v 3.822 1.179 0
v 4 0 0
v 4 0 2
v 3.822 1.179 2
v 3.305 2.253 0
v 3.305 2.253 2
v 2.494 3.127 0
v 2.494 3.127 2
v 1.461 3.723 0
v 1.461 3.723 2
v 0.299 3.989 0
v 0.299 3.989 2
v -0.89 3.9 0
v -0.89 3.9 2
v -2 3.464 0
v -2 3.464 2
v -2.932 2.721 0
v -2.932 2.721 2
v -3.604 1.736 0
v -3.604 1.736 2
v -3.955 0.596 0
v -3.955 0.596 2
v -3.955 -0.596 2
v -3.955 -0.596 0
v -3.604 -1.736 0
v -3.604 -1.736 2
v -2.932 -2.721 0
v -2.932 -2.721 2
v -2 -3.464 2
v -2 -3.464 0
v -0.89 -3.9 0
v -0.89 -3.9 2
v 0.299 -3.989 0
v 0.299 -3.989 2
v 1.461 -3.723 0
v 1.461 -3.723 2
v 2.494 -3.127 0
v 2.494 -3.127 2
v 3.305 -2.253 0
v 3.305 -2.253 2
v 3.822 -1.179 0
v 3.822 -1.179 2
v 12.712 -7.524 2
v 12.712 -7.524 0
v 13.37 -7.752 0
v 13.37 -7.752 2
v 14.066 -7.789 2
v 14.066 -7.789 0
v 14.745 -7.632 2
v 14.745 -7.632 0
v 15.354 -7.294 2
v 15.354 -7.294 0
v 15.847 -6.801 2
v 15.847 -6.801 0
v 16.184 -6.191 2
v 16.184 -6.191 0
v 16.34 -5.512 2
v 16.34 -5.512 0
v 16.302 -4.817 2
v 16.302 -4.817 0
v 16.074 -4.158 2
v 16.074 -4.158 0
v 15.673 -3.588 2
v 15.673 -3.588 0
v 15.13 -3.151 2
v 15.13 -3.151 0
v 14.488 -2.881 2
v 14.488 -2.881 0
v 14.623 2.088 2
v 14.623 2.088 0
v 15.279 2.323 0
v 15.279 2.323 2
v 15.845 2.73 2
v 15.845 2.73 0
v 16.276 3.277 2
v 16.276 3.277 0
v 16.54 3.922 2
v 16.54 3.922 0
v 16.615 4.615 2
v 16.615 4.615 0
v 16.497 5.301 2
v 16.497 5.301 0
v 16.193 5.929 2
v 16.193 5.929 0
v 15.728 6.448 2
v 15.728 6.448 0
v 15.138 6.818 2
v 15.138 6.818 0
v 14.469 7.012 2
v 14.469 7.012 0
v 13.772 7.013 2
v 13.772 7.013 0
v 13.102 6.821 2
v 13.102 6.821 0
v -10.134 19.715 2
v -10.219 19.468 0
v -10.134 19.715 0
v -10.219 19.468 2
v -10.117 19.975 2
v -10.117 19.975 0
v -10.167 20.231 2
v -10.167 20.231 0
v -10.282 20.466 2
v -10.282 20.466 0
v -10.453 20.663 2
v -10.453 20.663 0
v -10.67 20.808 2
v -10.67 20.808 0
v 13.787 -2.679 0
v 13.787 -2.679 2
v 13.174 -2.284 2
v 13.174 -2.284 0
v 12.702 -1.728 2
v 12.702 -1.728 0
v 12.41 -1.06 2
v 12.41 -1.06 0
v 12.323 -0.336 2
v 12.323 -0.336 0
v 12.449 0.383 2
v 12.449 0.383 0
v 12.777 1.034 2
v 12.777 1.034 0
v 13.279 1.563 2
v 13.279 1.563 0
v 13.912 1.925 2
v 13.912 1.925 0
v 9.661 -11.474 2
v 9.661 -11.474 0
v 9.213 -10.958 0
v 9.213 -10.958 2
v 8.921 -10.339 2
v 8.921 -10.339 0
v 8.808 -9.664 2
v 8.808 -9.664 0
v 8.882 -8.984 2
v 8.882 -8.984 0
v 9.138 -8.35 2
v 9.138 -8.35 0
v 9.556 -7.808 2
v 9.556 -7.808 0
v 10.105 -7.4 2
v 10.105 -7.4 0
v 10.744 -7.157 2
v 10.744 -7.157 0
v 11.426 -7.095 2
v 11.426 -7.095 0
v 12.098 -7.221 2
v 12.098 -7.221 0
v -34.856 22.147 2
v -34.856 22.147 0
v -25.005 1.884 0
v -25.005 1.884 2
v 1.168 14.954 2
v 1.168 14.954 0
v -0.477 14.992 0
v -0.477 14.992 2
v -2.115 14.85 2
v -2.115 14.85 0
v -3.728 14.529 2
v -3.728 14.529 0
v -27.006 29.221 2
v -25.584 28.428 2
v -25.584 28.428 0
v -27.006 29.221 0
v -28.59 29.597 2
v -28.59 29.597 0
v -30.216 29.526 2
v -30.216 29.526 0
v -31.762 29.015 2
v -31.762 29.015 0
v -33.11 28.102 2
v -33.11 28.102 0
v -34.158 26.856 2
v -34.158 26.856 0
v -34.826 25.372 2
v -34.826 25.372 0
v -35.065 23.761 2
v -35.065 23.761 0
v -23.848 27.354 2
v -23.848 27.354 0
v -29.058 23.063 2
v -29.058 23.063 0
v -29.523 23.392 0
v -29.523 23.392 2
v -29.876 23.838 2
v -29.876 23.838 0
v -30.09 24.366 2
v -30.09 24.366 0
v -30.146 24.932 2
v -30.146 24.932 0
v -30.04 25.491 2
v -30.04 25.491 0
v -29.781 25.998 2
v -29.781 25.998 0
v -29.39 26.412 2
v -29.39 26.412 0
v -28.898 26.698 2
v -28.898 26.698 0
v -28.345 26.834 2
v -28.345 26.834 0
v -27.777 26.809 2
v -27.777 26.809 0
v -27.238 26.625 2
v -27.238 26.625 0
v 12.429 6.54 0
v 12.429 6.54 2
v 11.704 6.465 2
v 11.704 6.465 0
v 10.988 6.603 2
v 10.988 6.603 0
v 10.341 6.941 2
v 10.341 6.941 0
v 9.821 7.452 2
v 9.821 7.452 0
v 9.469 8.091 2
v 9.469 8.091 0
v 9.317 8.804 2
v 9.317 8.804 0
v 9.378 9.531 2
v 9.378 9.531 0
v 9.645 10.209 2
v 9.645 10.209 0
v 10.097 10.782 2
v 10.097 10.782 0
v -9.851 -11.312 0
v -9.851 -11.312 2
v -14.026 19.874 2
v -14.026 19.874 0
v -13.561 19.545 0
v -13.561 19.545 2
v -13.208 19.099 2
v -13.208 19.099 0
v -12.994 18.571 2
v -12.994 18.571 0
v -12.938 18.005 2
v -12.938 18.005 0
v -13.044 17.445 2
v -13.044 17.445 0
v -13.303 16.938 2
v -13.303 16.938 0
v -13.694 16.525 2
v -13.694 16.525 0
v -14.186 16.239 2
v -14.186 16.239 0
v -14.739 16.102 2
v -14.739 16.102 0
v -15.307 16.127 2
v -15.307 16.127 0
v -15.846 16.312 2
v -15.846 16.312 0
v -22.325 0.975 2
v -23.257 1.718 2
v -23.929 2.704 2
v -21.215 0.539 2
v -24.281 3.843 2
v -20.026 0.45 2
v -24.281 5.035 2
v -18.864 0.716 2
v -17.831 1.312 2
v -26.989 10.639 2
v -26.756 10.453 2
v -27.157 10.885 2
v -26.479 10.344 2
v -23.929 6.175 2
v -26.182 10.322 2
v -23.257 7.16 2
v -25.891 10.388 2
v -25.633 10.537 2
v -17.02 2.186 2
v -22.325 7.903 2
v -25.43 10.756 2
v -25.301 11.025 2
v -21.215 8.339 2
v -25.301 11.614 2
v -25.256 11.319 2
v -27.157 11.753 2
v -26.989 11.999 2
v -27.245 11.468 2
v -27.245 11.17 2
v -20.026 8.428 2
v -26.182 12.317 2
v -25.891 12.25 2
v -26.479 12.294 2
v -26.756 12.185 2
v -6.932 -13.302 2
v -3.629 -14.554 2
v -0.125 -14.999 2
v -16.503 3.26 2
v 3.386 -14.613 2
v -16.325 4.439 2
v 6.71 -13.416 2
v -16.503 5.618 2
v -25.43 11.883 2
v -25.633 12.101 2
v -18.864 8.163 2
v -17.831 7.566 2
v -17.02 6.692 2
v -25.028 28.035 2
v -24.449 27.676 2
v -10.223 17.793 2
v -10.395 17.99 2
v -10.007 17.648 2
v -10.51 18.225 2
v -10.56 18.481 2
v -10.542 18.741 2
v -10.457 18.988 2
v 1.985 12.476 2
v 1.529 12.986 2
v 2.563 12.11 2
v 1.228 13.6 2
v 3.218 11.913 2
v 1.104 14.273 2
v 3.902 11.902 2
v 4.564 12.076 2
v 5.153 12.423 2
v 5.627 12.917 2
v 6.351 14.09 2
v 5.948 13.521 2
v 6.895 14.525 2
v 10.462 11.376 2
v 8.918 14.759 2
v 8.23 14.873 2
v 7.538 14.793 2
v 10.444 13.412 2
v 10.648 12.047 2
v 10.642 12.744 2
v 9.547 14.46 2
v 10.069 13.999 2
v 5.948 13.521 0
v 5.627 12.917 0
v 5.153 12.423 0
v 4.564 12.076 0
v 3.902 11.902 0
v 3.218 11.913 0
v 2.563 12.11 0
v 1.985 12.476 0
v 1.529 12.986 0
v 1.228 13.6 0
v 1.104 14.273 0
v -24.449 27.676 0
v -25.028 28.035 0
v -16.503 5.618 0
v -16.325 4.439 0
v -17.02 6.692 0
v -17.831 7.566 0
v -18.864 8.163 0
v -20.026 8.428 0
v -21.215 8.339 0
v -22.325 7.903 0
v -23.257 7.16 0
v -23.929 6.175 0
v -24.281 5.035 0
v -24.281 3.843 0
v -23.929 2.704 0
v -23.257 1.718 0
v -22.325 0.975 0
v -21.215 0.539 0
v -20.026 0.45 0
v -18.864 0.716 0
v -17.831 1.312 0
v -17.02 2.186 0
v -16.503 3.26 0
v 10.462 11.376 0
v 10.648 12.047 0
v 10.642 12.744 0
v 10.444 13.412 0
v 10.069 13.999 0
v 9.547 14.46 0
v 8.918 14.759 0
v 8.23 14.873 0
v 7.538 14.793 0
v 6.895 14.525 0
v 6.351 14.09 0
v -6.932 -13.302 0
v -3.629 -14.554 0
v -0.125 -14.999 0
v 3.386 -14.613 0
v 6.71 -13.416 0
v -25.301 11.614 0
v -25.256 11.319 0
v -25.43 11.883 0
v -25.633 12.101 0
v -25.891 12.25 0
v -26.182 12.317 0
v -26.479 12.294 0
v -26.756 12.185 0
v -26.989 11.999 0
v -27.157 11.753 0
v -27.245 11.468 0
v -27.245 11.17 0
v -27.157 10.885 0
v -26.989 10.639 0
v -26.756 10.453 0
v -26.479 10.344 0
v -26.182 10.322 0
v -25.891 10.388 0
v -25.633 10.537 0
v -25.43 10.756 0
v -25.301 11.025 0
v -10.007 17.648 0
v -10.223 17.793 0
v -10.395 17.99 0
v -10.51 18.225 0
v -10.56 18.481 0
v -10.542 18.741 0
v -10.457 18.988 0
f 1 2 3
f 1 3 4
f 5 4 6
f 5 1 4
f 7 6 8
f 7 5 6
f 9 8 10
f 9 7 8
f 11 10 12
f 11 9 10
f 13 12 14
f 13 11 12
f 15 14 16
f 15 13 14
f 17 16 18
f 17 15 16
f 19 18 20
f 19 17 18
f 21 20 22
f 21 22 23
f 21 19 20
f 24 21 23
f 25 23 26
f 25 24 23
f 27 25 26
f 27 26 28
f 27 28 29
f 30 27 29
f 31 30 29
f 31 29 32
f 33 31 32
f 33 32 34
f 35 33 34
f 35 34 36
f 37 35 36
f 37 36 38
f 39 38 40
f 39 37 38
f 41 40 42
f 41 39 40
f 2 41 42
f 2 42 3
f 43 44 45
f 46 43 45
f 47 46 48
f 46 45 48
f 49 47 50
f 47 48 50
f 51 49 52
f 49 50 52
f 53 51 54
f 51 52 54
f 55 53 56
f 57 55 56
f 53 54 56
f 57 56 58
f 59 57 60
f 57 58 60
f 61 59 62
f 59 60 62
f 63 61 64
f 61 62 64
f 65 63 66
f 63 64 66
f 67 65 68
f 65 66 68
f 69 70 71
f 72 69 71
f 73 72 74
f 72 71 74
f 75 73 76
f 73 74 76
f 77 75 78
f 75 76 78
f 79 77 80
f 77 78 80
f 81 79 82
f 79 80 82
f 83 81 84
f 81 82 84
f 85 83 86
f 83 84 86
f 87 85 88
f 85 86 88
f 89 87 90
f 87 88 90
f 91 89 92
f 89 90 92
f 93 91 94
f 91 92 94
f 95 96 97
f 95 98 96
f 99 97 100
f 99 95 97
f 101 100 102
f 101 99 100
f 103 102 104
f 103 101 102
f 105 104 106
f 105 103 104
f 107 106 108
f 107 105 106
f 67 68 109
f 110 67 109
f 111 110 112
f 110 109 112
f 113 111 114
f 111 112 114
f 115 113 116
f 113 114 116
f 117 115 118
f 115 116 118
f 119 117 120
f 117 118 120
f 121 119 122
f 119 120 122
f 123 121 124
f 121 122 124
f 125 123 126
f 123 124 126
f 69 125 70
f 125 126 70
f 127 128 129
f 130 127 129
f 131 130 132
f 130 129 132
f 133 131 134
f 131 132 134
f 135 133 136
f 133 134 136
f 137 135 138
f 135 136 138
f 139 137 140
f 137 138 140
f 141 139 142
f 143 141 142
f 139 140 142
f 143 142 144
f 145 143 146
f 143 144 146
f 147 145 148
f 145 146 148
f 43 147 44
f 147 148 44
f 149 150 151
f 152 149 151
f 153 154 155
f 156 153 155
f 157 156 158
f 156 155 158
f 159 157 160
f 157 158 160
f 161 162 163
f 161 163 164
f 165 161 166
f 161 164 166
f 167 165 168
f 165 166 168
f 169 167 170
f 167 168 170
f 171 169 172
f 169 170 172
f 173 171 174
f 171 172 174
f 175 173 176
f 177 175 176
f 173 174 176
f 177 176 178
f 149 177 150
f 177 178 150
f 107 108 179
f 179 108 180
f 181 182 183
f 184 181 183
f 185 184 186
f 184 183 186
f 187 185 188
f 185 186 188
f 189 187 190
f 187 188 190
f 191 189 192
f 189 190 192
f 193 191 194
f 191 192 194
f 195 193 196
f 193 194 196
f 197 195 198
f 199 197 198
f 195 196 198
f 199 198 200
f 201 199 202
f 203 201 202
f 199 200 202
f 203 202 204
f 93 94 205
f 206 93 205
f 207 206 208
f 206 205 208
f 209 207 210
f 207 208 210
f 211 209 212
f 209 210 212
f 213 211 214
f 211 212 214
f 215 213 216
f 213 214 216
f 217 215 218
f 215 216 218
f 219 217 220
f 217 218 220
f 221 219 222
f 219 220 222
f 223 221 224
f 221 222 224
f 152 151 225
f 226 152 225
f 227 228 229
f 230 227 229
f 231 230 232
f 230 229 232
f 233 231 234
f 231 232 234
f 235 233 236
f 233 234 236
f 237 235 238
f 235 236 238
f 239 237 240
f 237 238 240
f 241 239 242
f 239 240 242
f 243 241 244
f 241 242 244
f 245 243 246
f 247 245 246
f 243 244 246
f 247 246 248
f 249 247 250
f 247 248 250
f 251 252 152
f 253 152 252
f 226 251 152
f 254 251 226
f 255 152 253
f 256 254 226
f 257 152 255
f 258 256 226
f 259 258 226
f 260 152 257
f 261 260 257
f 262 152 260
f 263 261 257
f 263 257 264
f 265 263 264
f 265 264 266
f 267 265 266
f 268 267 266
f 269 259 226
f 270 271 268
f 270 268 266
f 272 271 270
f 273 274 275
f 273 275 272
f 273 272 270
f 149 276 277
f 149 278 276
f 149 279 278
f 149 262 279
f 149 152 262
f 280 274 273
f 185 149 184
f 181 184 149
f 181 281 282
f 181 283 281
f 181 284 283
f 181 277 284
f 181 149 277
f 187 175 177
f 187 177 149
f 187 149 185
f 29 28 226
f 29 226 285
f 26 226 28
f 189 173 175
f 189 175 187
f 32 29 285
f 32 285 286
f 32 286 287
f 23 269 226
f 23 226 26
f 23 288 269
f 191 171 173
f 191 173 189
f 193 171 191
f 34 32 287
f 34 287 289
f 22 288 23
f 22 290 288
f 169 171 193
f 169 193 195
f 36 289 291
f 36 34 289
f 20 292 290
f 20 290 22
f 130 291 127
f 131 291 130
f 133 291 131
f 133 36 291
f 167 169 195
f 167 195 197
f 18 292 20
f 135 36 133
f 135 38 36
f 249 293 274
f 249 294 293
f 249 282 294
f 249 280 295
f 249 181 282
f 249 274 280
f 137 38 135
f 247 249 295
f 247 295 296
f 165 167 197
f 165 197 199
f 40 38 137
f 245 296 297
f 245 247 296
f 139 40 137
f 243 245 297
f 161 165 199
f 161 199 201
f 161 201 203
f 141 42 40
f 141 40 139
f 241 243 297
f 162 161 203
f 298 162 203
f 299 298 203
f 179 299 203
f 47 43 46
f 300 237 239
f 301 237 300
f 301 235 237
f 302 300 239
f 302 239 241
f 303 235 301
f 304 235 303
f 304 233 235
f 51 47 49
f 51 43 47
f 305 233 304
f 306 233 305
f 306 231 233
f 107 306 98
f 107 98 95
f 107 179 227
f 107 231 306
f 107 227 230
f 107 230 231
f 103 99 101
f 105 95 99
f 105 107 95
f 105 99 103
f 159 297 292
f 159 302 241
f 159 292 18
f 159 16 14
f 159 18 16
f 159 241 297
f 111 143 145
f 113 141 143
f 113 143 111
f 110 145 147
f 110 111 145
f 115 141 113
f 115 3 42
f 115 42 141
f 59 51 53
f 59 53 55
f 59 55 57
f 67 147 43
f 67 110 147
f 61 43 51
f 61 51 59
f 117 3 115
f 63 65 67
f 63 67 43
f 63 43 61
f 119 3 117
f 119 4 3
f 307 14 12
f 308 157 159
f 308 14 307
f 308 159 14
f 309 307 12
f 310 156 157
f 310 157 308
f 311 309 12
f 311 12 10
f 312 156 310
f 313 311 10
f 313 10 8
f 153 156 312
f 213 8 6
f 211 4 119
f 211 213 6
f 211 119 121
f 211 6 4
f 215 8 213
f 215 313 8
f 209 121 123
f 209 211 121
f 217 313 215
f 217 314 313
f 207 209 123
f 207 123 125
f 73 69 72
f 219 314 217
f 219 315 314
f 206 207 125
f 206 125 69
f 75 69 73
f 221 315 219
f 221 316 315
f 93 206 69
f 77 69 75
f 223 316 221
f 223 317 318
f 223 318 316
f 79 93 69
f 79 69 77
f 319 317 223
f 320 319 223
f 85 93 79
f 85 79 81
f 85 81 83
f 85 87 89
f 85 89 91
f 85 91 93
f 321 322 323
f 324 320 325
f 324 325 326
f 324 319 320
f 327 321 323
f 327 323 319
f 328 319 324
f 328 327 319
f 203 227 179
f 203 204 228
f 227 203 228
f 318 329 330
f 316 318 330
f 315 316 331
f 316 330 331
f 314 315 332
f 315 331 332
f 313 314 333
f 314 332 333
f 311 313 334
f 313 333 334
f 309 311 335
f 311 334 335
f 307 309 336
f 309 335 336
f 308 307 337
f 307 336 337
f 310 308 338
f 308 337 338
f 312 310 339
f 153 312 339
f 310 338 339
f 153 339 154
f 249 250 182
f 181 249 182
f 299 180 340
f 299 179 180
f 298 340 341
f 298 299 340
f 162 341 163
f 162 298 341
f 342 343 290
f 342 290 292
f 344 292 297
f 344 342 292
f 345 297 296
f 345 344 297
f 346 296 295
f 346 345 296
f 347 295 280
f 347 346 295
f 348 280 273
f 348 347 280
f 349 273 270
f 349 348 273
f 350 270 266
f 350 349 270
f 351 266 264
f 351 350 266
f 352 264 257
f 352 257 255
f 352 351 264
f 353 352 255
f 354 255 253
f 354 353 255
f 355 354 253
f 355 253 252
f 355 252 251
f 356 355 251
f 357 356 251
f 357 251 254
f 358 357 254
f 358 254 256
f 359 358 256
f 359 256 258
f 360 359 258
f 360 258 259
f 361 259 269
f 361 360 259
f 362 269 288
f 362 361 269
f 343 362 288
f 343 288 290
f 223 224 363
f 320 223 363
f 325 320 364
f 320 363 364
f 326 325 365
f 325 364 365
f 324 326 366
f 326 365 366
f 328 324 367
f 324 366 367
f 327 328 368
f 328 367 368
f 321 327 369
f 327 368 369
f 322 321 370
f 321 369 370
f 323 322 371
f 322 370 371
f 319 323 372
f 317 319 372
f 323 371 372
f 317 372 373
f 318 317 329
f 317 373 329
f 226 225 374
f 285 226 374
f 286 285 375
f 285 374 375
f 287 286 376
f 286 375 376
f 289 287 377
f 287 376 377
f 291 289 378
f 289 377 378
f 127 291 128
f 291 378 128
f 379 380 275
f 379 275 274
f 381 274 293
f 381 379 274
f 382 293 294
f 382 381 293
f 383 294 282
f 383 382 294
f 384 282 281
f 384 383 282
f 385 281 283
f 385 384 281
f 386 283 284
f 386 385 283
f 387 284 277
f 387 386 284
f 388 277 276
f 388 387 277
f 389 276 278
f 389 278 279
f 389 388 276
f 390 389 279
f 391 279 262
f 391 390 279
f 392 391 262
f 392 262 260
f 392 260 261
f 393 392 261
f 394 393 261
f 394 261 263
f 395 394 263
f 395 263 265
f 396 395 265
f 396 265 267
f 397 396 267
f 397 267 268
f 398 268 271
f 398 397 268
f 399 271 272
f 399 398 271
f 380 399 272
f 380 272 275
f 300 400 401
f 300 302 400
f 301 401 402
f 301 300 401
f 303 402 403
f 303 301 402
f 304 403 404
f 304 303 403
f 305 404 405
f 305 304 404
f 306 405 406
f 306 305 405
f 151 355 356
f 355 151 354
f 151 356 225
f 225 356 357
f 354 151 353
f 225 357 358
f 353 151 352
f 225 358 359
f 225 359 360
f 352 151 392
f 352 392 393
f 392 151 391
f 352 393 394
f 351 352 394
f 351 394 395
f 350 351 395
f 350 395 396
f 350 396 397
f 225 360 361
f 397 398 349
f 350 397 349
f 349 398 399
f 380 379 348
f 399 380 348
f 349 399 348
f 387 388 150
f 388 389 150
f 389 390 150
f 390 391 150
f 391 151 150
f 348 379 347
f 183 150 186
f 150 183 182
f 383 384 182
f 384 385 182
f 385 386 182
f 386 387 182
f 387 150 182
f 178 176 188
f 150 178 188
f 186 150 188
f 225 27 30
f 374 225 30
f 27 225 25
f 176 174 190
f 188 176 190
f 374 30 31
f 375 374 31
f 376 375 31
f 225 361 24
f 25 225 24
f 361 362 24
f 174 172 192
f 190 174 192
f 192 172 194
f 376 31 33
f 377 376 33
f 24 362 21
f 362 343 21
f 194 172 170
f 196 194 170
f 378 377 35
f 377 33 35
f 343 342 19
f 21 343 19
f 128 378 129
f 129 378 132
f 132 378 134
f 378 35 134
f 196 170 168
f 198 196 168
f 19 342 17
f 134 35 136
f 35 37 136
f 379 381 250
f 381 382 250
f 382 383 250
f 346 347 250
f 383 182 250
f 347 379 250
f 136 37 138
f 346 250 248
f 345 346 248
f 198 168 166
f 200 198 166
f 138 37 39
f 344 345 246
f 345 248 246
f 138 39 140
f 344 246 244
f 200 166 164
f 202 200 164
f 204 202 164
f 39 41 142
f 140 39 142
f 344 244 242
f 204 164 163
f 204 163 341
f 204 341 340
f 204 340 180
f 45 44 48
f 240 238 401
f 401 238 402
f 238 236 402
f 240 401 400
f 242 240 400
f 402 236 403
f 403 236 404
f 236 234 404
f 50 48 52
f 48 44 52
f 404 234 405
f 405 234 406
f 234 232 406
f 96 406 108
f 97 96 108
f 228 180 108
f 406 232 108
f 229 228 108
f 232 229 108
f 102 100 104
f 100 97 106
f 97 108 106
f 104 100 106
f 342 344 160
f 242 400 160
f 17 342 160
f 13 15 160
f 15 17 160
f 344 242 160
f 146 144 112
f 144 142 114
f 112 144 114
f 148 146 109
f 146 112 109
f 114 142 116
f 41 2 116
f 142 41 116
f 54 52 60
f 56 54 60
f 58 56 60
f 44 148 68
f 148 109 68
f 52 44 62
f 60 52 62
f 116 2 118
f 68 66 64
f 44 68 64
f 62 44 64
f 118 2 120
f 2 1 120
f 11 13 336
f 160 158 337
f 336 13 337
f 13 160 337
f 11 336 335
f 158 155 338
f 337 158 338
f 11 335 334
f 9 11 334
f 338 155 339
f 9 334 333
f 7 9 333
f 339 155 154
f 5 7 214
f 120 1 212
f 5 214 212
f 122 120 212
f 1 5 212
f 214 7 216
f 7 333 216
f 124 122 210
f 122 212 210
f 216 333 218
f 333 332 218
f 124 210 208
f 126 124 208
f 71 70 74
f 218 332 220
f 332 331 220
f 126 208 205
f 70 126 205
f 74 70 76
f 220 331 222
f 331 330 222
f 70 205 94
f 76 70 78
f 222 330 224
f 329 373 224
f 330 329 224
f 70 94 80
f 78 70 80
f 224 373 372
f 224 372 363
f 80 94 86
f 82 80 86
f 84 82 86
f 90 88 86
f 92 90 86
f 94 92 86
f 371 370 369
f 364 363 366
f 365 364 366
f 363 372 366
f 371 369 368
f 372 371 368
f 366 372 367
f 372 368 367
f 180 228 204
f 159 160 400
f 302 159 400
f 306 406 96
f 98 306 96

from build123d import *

# Parameters (mm, degrees)
ESQUISSE1_R        = 4
ESQUISSE1_R_2      = 1
BOSS_EXTRU_1_DEPTH = 2
CONG_1_R           = 1
CONG_2_R           = 11


with BuildPart() as part:
    # Esquisse1 → Boss.-Extru.1 (new body)
    with BuildSketch(Plane.XY):
        with BuildLine():
            Line((-3.728432128, 14.529239273), (-10.902133324, 18.092613259))
            Line((-10.902133324, 18.092613259), (-9.77414371, 20.363455577))
            Line((-9.77414371, 20.363455577), (-25.005281494, 27.929179137))
            ThreePointArc((-25.005281494, 27.929179137), (-32.144223962, 28.809157948), (-34.856074883, 22.146971607))
            Line((-34.856074883, 22.146971607), (-25.005281494, 1.884444499))
            Line((-25.005281494, 1.884444499), (-9.850606554, -11.31218593))
            ThreePointArc((-9.850606554, -11.31218593), (-0.12474397, -14.999481289), (9.661100255, -11.47445606))
            ThreePointArc((9.661100255, -11.47445606), (9.328139992, -8.064479271), (12.711512496, -7.524484146))
            ThreePointArc((12.711512496, -7.524484146), (16.183775509, -6.191442889), (14.487891216, -2.881218443))
            ThreePointArc((14.487891216, -2.881218443), (12.323112571, -0.335609675), (14.623234656, 2.088401251))
            ThreePointArc((14.623234656, 2.088401251), (16.496773903, 5.301415429), (13.102212542, 6.821468911))
            ThreePointArc((13.102212542, 6.821468911), (9.820570557, 7.451720018), (10.097110191, 10.781872629))
            ThreePointArc((10.097110191, 10.781872629), (9.547104174, 14.460337363), (5.948313856, 13.521019705))
            ThreePointArc((5.948313856, 13.521019705), (2.883768887, 11.988907316), (1.167882396, 14.954465912))
            ThreePointArc((1.167882396, 14.954465912), (-1.297808983, 14.94375093), (-3.728432128, 14.529239273))
        make_face()
        with Locations((-20.325227829, 4.439090716)):
            Circle(ESQUISSE1_R, mode=Mode.SUBTRACT)
        with Locations((-26.256387143, 11.319323515)):
            Circle(ESQUISSE1_R_2, mode=Mode.SUBTRACT)
        with BuildLine():
            ThreePointArc((-29.058075564, 23.063121212), (-29.928943128, 25.754141406), (-27.237922934, 26.625008971))
            Line((-27.237922934, 26.625008971), (-14.025891569, 19.873557138))
            ThreePointArc((-14.025891569, 19.873557138), (-13.155024005, 17.182536944), (-15.846044199, 16.31166938))
            Line((-15.846044199, 16.31166938), (-29.058075564, 23.063121212))
        make_face(mode=Mode.SUBTRACT)
        Circle(ESQUISSE1_R, mode=Mode.SUBTRACT)
    extrude(amount=BOSS_EXTRU_1_DEPTH)

    # Congé1
    cong_1_edges = [part.edges().sort_by_distance(p)[0] for p in [
        (-9.77414371, 20.363455577, 1),
        (-10.902133324, 18.092613259, 1),
    ]]
    fillet(cong_1_edges, radius=CONG_1_R)

    # Congé2
    cong_2_edges = [part.edges().sort_by_distance(p)[0] for p in [
        (-25.005281494, 27.929179137, 1),
    ]]
    fillet(cong_2_edges, radius=CONG_2_R)


solid = part.part
